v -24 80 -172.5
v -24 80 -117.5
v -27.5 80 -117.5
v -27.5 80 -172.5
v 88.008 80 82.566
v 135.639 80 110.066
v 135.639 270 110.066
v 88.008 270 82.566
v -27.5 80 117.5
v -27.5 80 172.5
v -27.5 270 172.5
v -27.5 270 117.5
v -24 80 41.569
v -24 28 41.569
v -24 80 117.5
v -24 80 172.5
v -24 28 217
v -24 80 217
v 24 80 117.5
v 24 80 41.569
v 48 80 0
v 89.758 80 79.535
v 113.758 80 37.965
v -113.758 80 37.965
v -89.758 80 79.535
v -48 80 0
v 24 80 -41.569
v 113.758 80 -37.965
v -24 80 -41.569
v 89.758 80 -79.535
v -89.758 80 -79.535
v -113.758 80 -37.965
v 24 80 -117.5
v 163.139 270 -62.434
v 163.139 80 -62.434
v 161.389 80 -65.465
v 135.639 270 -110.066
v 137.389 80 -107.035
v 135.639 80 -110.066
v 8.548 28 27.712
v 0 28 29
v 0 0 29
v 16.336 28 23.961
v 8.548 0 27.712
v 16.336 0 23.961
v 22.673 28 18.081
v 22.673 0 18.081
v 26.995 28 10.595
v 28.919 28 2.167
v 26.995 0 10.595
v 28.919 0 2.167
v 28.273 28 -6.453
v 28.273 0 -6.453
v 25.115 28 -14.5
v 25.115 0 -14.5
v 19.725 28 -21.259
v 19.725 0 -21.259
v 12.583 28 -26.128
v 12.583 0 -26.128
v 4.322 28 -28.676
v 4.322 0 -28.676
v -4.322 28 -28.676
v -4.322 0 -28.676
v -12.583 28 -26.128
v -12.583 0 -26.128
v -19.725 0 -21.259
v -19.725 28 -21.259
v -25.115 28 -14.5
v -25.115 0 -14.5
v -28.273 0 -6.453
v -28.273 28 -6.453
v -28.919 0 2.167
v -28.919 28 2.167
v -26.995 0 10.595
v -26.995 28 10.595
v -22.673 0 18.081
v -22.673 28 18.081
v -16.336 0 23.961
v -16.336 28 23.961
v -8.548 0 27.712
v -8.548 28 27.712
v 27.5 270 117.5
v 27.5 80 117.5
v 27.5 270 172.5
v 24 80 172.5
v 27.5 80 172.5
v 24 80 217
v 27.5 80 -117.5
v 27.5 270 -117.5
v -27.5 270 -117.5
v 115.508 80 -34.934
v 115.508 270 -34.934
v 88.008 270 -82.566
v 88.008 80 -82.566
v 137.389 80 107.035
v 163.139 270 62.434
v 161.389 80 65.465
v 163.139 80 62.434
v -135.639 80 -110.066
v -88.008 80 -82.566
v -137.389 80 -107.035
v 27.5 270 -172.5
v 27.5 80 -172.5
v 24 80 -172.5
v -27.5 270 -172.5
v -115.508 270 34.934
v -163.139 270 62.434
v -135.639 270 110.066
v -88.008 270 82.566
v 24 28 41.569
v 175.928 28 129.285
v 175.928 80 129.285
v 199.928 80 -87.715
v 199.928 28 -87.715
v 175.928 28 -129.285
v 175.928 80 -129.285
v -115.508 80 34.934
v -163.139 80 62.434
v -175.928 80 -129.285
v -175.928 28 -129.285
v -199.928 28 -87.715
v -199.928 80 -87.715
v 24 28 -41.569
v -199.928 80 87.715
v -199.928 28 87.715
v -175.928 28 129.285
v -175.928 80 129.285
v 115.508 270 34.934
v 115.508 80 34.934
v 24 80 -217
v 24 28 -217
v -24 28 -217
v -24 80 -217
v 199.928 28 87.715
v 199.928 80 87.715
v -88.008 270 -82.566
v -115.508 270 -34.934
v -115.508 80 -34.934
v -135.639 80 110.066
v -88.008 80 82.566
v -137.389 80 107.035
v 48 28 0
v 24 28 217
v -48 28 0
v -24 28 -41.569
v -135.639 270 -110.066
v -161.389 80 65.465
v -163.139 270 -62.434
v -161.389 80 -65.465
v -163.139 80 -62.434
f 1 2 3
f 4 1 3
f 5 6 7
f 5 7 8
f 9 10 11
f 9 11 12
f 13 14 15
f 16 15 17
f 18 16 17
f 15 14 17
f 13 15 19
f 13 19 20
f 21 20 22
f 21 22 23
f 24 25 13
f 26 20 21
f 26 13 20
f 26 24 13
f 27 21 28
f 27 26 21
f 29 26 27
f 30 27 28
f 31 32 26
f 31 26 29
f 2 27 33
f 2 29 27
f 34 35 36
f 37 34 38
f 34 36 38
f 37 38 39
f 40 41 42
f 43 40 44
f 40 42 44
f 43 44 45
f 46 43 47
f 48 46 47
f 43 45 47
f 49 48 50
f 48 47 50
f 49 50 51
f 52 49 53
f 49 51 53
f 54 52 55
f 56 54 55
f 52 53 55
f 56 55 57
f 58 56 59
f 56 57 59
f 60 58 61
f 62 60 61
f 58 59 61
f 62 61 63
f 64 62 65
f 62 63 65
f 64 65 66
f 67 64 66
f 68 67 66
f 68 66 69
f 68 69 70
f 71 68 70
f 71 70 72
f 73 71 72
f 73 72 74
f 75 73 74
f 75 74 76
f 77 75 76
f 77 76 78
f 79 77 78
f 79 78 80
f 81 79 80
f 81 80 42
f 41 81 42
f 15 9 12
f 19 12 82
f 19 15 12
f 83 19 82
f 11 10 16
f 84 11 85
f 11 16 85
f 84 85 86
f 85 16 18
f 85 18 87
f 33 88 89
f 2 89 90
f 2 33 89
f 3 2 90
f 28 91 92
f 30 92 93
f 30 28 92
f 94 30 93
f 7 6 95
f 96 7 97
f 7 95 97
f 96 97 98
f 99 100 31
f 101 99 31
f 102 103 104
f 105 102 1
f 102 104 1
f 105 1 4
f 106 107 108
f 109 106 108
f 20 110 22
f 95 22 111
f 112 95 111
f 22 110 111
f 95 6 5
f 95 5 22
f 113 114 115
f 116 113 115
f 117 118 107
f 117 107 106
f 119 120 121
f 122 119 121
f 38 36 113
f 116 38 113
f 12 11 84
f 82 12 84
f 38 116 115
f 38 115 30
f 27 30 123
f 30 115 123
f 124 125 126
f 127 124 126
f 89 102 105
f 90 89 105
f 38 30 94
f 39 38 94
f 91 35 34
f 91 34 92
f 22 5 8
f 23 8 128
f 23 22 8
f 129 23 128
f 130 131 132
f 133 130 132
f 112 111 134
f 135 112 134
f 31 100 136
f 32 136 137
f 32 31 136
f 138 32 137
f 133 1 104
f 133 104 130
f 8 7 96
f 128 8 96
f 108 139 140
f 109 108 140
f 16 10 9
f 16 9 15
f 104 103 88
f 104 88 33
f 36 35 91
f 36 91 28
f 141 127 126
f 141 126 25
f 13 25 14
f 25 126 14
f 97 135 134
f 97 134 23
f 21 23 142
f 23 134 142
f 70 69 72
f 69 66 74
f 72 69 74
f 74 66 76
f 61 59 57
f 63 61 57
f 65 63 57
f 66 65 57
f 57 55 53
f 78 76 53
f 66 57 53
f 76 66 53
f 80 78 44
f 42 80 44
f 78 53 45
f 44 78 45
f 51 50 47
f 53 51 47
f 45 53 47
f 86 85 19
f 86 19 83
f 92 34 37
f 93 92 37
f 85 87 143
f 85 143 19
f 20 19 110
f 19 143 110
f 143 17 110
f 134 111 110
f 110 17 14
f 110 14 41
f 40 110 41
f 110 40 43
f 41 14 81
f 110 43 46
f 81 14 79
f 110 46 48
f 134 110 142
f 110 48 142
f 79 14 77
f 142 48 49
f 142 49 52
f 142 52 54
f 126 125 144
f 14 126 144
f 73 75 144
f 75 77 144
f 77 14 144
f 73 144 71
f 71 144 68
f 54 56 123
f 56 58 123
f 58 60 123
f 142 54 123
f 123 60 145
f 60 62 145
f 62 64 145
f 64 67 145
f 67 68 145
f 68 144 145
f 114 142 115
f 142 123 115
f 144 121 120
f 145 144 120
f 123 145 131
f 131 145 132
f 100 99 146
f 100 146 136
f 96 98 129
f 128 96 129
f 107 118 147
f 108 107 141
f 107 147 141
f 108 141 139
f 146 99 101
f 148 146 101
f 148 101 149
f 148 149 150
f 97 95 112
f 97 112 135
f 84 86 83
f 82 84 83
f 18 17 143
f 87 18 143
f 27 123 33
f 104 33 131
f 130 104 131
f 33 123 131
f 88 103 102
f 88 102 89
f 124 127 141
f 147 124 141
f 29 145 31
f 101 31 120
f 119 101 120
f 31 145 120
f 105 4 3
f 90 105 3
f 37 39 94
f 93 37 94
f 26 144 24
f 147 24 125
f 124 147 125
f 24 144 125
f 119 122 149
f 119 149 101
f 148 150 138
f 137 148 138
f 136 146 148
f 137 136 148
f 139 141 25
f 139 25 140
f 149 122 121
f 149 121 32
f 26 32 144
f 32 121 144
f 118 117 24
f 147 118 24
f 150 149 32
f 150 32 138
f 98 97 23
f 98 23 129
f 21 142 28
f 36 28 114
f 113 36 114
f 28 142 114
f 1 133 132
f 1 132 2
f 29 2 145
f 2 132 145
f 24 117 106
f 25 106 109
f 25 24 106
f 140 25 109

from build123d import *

# Parameters (mm, degrees)
SKETCH1_R           = 29
BOSS_EXTRUDE1_DEPTH = 28
BOSS_EXTRUDE2_DEPTH = 52
SKETCH3_W           = 55
SKETCH3_H           = 55
BOSS_EXTRUDE3_DEPTH = 190
CIRPATTERN1_COUNT   = 6


with BuildPart() as part:
    # Sketch1 → Boss-Extrude1 (new body)
    with BuildSketch(Plane(origin=(0, 0, 0), x_dir=(1, 0, 0), z_dir=(0, 1, 0))):
        Circle(SKETCH1_R)
    extrude(amount=BOSS_EXTRUDE1_DEPTH)

    # Sketch2 → Boss-Extrude2 (add)
    with BuildSketch(Plane(origin=(0, 28, 0), x_dir=(1, 0, 0), z_dir=(0, 1, 0))):
        Polygon((24, 0), (24, 174), (-24, 174), (-24, 0), (-24, -217), (24, -217), align=None)
    boss_extrude2 = extrude(amount=BOSS_EXTRUDE2_DEPTH)

    # Sketch3 → Boss-Extrude3 (add)
    with BuildSketch(Plane(origin=(0, 80, 0), x_dir=(1, 0, 0), z_dir=(0, 1, 0))):
        with Locations((0, -145)):
            Rectangle(SKETCH3_W, SKETCH3_H)
    boss_extrude3 = extrude(amount=BOSS_EXTRUDE3_DEPTH)

    # CirPattern1: Boss-Extrude2, Boss-Extrude3 ×6 about axis
    cirpattern1_axis = Axis((0, 28, 0), (0, -1, 0))
    add([boss_extrude2.rotate(cirpattern1_axis, i * 360 / CIRPATTERN1_COUNT) for i in range(1, CIRPATTERN1_COUNT)])
    add([boss_extrude3.rotate(cirpattern1_axis, i * 360 / CIRPATTERN1_COUNT) for i in range(1, CIRPATTERN1_COUNT)])


solid = part.part
